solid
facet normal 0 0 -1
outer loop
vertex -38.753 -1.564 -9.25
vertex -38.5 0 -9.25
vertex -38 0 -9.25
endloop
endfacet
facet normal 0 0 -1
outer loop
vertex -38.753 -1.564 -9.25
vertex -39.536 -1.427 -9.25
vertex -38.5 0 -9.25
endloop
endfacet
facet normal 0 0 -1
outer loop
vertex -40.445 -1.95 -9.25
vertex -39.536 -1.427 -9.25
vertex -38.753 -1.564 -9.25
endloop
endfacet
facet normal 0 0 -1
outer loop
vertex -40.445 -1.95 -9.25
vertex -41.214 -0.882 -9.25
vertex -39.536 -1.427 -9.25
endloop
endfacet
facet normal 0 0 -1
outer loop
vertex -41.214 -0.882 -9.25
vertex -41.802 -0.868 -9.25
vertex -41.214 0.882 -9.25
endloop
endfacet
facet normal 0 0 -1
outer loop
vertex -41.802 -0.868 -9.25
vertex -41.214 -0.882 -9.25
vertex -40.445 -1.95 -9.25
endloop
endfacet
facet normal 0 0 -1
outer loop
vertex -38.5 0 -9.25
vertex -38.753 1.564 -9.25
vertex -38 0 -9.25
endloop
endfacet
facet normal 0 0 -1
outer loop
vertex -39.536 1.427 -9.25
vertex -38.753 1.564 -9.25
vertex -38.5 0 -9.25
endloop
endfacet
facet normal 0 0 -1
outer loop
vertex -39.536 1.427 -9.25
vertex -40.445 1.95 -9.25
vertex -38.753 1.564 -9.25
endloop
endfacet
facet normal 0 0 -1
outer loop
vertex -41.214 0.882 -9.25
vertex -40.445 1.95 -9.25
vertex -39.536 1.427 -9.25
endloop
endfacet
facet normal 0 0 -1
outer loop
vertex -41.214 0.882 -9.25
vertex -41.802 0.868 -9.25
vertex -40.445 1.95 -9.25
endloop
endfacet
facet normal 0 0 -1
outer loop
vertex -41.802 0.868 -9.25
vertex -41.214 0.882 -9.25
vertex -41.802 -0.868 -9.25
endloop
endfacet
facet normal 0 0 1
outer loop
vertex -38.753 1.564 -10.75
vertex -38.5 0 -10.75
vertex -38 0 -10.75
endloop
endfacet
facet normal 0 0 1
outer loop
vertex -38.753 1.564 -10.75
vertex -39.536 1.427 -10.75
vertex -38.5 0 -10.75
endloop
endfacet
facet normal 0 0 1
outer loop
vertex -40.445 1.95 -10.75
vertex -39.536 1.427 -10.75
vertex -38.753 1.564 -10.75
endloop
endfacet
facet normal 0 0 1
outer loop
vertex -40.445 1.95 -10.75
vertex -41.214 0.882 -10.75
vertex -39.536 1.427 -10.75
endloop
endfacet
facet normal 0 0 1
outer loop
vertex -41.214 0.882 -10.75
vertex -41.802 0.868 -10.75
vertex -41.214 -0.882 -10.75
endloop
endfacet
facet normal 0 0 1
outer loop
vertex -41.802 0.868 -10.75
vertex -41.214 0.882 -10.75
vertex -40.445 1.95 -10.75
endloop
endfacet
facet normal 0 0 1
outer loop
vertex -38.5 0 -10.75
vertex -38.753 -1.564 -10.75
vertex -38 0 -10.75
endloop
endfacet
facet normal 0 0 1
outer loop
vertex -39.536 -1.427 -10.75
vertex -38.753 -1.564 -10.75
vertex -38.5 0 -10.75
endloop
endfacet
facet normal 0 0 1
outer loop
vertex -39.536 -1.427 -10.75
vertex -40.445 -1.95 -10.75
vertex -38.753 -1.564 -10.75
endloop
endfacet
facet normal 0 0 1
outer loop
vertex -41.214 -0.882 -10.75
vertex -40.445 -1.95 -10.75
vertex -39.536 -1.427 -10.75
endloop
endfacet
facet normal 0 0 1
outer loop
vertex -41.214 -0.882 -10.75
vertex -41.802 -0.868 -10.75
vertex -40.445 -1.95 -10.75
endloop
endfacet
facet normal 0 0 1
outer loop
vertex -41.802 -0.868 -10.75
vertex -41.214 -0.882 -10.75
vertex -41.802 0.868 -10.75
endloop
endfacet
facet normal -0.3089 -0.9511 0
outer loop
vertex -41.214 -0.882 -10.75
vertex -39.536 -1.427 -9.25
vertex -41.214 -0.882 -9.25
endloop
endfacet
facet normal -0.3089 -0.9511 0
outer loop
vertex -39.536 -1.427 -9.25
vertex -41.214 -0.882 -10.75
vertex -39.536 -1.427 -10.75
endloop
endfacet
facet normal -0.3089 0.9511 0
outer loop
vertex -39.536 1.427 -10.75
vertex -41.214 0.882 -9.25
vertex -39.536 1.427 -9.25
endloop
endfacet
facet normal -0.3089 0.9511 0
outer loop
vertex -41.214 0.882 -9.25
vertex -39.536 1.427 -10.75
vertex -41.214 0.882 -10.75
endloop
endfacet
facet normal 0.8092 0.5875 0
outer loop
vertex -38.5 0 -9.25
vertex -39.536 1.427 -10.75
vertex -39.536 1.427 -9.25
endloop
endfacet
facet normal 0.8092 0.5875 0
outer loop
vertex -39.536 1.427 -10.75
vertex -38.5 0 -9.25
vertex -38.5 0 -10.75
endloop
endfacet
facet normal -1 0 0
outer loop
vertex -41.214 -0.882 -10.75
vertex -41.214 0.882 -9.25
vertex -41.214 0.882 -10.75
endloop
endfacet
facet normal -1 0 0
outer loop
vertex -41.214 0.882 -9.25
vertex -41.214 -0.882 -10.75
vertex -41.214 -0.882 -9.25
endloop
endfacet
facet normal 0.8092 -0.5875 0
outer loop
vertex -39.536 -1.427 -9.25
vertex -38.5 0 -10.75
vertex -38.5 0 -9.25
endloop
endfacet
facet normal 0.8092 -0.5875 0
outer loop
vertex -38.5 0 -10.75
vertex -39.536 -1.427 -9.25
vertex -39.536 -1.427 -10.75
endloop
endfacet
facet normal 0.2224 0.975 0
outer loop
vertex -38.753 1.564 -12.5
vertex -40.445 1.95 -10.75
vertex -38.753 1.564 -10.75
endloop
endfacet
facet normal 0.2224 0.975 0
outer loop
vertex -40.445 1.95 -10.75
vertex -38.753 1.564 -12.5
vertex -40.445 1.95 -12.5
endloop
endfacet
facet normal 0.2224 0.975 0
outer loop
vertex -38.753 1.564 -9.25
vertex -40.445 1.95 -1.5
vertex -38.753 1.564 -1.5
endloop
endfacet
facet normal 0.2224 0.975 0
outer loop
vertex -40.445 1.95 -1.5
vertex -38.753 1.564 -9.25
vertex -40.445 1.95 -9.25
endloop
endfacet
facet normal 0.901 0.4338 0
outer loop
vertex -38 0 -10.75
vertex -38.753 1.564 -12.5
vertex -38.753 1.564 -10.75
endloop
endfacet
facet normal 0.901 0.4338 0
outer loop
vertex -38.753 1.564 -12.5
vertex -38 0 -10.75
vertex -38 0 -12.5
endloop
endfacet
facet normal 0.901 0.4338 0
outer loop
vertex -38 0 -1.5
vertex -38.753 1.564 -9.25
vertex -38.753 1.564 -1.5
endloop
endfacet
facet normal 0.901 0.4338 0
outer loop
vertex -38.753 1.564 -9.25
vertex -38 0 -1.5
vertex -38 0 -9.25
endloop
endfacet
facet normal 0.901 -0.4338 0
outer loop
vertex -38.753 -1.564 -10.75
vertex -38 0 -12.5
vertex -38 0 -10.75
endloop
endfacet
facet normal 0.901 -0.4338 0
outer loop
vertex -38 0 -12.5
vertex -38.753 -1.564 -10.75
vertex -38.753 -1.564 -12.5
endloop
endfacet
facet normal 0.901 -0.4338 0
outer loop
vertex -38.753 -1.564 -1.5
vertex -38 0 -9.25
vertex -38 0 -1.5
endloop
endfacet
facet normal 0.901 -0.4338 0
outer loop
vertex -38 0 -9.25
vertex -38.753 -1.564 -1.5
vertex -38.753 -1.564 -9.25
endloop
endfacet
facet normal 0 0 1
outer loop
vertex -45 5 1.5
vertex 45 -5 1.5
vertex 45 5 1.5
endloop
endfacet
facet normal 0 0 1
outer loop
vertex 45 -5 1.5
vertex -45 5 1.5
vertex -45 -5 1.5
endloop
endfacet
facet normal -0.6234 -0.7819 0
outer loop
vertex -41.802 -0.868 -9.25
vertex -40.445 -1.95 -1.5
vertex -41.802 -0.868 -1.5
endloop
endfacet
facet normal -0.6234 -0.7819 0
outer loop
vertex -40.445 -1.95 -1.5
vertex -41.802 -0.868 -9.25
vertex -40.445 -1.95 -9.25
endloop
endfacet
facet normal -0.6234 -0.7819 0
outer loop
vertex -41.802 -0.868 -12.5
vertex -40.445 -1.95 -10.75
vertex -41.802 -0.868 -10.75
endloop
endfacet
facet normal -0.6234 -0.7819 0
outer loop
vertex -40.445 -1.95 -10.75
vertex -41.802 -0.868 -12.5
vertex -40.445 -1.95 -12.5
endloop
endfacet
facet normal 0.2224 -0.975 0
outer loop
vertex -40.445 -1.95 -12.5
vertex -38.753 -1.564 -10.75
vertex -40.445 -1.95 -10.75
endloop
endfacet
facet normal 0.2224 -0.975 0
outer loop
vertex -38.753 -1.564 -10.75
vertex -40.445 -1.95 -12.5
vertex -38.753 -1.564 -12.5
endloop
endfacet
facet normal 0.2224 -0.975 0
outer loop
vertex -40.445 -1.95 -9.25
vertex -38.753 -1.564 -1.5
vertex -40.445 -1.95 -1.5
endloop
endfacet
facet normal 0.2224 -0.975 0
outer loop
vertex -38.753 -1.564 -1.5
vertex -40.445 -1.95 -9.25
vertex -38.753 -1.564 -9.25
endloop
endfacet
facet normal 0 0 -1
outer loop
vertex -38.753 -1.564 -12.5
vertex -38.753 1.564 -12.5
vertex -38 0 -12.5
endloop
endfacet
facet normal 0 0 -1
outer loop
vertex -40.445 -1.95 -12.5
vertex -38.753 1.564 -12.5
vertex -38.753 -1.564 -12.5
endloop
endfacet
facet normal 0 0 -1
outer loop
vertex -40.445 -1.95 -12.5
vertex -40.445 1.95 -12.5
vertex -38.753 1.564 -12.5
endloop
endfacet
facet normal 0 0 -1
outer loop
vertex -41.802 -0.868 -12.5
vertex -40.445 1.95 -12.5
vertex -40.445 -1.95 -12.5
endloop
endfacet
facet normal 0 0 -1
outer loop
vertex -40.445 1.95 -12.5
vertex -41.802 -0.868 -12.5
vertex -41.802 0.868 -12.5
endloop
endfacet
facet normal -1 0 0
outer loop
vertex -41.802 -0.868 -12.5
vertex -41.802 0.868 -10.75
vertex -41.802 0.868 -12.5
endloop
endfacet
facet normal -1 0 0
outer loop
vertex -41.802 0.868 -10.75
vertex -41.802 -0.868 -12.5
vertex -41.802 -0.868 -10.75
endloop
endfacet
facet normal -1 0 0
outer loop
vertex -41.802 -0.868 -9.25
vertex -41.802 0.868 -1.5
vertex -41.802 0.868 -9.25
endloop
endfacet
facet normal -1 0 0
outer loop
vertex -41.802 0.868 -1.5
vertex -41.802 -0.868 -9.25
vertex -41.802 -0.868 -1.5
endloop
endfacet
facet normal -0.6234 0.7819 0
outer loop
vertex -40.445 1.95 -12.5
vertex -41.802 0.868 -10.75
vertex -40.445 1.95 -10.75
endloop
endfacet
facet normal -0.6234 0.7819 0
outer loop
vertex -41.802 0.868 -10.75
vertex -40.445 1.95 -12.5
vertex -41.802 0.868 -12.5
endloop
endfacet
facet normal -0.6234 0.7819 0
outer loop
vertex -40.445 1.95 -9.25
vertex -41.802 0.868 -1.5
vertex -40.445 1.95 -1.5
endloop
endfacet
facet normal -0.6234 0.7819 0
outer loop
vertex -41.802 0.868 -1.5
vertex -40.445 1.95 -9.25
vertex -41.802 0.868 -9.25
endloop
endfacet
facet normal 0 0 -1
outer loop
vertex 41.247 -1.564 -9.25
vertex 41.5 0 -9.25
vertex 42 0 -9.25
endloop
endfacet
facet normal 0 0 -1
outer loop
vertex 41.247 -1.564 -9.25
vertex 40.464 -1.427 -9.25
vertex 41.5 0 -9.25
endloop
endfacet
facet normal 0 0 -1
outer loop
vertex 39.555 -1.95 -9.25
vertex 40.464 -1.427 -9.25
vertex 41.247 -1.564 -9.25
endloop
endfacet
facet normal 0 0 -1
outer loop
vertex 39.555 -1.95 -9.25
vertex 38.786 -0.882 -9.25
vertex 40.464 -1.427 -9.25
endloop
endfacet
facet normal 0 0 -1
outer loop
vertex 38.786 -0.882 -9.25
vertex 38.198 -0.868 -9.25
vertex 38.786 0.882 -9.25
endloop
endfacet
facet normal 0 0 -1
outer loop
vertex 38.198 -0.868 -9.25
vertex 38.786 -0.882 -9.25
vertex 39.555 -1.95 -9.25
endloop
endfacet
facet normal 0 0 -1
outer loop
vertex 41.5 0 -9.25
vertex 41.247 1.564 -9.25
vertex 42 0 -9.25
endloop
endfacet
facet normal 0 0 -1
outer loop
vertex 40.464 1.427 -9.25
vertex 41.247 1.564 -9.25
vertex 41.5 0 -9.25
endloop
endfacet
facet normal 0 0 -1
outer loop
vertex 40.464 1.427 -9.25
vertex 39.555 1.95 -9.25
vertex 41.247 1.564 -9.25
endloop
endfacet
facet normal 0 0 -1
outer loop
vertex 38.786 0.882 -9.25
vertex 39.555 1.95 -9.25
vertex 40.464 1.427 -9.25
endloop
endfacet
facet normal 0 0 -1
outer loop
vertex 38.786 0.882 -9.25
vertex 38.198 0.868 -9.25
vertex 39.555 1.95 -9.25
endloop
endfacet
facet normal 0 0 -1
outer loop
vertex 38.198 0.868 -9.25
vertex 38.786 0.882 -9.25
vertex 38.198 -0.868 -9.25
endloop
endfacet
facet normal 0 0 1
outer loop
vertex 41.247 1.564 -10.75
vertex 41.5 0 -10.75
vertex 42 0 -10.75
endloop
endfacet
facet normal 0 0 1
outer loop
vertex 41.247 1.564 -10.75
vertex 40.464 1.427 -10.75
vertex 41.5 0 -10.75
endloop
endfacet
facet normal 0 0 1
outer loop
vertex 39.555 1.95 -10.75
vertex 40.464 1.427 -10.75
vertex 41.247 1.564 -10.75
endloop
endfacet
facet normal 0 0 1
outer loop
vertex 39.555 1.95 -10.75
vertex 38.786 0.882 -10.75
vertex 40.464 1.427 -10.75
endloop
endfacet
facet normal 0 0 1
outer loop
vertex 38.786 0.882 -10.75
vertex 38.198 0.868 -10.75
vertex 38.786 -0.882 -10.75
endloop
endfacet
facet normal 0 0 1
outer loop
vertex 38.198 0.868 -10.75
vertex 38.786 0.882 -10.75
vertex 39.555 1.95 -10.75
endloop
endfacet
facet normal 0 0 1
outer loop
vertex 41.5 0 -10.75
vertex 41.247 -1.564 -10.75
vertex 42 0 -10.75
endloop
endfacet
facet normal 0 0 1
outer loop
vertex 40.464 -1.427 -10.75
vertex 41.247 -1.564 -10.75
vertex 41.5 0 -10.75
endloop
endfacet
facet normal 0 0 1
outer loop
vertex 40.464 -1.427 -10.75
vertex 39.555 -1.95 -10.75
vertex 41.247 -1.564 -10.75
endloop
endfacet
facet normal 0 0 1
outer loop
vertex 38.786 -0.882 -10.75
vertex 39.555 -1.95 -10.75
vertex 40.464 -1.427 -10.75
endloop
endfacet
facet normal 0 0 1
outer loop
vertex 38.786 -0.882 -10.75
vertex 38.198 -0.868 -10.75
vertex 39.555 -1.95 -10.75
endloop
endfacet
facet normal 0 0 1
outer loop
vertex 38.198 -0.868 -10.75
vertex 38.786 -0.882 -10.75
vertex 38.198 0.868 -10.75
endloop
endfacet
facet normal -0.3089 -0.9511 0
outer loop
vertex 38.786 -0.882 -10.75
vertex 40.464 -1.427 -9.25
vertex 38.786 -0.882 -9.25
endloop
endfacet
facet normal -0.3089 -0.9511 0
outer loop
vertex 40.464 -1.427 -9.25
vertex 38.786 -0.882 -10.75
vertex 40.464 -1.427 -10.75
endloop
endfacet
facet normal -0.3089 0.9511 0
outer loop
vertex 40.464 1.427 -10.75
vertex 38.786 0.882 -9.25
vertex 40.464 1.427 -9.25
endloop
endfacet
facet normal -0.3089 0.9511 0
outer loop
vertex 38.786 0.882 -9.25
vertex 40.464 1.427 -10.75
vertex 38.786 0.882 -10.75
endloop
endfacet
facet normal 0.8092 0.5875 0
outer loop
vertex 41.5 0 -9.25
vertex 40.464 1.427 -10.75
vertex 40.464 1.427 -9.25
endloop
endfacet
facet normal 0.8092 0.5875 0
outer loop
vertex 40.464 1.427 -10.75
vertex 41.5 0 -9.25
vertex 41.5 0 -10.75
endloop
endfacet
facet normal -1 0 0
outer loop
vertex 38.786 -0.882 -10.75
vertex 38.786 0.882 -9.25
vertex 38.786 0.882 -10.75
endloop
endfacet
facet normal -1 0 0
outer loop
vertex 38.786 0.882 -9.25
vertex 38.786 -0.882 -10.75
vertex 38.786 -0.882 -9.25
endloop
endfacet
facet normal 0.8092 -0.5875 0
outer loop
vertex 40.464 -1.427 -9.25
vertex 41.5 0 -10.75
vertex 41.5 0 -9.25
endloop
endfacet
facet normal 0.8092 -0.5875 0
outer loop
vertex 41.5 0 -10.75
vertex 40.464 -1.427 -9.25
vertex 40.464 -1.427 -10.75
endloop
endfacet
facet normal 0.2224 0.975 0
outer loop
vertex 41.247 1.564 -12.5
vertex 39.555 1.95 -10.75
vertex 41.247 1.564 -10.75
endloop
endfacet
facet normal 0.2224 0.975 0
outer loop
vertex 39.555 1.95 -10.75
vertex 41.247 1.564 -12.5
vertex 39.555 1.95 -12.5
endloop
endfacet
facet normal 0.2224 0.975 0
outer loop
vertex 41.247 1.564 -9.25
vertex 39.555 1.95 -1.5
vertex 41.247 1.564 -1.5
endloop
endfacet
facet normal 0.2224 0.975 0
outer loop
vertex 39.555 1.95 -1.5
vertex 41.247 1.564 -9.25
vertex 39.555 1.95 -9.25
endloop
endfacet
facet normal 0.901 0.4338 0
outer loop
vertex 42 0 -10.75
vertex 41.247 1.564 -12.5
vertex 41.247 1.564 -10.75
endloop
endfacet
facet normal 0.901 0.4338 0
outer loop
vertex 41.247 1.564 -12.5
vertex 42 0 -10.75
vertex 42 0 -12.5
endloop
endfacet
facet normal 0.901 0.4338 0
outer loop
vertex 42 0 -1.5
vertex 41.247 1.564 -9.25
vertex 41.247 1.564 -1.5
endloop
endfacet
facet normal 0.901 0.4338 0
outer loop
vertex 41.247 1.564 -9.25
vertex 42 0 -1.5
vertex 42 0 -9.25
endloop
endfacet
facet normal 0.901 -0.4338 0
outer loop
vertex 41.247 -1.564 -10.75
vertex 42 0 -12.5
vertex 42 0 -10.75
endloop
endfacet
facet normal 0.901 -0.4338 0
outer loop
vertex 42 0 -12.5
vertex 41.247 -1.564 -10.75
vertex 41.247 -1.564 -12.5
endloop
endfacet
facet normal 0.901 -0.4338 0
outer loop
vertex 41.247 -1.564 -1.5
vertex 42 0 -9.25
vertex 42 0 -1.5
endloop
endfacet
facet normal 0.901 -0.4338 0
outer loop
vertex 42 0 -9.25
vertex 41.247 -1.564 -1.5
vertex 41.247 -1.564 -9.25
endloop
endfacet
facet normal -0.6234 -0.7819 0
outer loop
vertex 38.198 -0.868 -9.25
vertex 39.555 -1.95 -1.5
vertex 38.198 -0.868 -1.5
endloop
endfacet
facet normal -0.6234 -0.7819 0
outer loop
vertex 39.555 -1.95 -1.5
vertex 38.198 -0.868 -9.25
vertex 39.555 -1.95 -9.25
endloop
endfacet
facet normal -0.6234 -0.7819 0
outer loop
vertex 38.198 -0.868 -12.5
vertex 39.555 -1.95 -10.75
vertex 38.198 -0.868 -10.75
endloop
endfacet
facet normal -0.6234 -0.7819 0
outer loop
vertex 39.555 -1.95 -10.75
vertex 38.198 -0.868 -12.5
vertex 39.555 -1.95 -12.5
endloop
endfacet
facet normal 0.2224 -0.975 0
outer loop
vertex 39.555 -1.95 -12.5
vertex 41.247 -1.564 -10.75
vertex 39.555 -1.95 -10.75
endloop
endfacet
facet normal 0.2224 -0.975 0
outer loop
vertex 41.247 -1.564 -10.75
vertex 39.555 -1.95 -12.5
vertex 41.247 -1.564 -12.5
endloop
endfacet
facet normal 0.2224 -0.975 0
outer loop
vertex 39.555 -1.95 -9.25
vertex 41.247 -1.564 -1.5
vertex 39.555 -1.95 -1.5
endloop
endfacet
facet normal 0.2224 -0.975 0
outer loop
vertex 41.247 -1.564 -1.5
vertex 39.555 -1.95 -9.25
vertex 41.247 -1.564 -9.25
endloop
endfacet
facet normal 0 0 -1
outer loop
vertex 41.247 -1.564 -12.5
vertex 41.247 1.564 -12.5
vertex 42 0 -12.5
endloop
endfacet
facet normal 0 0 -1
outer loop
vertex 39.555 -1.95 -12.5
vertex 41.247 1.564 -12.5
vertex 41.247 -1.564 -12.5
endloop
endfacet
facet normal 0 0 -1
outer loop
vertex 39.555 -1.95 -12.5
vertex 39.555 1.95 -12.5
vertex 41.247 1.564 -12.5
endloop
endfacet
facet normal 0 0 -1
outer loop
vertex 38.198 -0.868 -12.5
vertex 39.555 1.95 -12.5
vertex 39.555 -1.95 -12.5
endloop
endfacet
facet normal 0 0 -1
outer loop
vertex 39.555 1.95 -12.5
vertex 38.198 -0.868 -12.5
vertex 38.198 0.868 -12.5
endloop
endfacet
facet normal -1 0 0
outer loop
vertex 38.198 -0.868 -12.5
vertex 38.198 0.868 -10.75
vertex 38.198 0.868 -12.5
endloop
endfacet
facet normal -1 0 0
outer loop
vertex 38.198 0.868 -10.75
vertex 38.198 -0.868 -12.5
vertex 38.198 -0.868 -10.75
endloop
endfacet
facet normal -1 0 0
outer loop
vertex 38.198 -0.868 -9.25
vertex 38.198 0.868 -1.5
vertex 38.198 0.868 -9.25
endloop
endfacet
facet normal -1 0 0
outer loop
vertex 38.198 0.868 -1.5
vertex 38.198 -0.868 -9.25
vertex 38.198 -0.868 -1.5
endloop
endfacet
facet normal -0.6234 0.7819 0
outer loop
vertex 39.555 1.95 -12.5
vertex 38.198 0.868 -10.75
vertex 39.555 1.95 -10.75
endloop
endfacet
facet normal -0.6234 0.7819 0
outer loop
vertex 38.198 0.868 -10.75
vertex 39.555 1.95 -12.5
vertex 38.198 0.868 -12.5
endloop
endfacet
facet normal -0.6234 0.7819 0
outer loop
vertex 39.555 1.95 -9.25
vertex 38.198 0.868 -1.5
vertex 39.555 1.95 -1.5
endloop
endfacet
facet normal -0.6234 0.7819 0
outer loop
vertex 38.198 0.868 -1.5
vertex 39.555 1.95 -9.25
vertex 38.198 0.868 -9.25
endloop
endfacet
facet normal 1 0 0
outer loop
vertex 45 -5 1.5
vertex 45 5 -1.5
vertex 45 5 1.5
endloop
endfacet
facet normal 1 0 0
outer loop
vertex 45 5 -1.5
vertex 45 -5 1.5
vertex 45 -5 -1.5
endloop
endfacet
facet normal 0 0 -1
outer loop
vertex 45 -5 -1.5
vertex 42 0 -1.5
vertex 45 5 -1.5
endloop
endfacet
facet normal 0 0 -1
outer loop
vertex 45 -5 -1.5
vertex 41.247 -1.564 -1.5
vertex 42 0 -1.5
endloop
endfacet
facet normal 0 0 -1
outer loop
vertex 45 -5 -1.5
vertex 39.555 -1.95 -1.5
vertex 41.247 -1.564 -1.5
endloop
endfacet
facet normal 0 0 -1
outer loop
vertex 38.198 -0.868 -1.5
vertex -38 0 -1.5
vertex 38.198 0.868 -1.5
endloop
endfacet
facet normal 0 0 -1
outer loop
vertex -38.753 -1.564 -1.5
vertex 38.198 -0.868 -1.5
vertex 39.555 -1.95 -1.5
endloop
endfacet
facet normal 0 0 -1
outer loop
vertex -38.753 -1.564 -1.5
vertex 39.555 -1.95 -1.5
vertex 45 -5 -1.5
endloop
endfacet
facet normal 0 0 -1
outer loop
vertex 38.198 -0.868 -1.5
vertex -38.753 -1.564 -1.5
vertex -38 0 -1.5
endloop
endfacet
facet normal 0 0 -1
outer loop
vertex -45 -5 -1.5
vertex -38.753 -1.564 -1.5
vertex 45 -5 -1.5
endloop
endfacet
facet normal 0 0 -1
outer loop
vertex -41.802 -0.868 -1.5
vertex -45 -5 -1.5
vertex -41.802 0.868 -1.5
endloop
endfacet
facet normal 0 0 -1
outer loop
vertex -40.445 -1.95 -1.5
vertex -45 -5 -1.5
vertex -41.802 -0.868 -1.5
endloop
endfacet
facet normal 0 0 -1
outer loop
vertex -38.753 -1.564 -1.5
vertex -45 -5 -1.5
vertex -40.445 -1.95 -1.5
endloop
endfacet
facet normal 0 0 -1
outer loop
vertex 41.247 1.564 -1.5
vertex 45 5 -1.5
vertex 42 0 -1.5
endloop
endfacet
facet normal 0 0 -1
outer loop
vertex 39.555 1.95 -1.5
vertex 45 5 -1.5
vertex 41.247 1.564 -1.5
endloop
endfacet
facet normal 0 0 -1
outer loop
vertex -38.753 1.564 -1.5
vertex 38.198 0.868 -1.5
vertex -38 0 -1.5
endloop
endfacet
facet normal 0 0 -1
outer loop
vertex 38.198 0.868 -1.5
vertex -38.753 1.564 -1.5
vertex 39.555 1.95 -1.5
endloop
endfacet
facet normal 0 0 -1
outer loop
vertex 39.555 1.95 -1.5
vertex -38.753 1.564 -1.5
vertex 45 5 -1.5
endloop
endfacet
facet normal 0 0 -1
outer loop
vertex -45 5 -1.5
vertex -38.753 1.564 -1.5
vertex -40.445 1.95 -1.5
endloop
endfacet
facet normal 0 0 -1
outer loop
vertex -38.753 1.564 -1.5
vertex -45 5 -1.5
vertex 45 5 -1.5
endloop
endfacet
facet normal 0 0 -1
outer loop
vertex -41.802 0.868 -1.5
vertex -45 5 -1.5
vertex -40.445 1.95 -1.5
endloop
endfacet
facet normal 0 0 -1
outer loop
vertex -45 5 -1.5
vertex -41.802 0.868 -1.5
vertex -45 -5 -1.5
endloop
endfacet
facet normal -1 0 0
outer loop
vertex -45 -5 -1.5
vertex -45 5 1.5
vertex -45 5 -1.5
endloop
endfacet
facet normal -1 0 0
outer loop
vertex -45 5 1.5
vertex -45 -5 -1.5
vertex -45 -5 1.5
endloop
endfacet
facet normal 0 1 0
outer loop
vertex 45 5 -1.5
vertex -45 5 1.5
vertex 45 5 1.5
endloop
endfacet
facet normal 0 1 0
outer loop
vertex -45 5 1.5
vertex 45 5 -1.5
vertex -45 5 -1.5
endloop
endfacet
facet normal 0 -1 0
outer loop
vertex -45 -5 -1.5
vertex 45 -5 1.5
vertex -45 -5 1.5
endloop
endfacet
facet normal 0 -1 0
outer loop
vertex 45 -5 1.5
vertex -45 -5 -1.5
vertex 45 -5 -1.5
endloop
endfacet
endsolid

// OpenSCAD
// file: jumperpart.scad
module jumperpart()
{
    
    difference()
    {
        translate([0, 0, -5.5]) cylinder(14, 2, 2, center = true);
        translate([0, 0, -10]) difference()
        {
            cylinder(1.5, 3, 3, center = true);
            cylinder(1.5, 1.5, 1.5, center = true);
        }
    }

}
// main file
use <jumperpart.scad>

module bigjumper()
{
    union()
    {
        cube([90, 10, 3], center = true);
        translate([-40, 0, 0]) jumperpart();
        translate([40, 0, 0]) jumperpart();
    }
}


bigjumper();
